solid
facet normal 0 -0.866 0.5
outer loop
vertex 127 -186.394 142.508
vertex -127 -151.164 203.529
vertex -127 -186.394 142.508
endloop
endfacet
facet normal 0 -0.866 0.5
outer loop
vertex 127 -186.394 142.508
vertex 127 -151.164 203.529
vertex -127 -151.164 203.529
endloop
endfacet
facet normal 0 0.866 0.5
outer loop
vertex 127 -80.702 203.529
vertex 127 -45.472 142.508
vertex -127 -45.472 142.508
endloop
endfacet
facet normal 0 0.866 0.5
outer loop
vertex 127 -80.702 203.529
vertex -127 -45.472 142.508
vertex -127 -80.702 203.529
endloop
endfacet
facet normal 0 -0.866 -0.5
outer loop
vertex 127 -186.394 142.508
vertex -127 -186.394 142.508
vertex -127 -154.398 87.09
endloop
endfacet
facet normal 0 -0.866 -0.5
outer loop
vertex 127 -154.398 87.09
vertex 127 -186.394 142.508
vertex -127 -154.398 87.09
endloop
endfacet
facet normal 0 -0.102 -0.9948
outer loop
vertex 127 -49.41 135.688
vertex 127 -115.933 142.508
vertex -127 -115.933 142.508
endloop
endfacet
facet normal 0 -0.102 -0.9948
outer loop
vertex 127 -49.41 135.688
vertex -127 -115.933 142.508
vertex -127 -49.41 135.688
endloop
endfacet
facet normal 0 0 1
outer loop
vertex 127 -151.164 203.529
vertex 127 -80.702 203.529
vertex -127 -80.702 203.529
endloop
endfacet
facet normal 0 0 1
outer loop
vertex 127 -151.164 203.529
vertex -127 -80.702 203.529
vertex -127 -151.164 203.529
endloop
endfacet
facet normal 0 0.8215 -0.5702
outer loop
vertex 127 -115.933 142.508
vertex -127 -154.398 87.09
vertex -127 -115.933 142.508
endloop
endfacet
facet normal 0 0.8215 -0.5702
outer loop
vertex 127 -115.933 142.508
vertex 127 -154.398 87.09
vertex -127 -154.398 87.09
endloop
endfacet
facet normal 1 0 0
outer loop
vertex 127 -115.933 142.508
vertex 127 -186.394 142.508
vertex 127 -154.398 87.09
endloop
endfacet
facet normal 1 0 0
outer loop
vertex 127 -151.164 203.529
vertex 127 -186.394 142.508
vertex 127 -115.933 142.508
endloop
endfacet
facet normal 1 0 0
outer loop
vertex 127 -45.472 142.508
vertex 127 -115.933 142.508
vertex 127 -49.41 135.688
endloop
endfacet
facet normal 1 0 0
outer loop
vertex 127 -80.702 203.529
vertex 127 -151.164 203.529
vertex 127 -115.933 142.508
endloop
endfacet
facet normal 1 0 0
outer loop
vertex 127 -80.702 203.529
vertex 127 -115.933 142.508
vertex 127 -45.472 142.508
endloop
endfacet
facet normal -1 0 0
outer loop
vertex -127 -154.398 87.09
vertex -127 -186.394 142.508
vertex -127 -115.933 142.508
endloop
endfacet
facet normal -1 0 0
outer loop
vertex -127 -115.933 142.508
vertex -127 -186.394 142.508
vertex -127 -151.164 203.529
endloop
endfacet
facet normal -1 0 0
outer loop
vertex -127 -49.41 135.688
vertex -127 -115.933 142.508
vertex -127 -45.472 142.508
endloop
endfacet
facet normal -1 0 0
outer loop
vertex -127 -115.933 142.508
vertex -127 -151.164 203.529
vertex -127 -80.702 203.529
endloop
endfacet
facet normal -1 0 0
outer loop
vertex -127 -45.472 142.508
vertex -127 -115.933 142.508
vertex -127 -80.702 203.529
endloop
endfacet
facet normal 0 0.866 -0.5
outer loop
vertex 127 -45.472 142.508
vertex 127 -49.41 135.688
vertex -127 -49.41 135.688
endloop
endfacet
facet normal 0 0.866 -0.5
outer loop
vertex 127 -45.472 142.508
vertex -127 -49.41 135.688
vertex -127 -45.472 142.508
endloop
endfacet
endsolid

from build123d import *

# Parameters (mm, degrees)
F1_DEPTH = 127


with BuildPart() as f1:
    # F0 (on Right) → F1 (new body, symmetric)
    with BuildSketch(Plane.YZ):
        Polygon((-154.398493, 87.090496), (-115.932986, 142.508402), (-49.40985, 135.687735), (-45.471936, 142.508402), (-80.702461, 203.529462), (-151.163511, 203.529462), (-186.394036, 142.508402), align=None)
    extrude(amount=F1_DEPTH, both=True)


solid = f1.part
